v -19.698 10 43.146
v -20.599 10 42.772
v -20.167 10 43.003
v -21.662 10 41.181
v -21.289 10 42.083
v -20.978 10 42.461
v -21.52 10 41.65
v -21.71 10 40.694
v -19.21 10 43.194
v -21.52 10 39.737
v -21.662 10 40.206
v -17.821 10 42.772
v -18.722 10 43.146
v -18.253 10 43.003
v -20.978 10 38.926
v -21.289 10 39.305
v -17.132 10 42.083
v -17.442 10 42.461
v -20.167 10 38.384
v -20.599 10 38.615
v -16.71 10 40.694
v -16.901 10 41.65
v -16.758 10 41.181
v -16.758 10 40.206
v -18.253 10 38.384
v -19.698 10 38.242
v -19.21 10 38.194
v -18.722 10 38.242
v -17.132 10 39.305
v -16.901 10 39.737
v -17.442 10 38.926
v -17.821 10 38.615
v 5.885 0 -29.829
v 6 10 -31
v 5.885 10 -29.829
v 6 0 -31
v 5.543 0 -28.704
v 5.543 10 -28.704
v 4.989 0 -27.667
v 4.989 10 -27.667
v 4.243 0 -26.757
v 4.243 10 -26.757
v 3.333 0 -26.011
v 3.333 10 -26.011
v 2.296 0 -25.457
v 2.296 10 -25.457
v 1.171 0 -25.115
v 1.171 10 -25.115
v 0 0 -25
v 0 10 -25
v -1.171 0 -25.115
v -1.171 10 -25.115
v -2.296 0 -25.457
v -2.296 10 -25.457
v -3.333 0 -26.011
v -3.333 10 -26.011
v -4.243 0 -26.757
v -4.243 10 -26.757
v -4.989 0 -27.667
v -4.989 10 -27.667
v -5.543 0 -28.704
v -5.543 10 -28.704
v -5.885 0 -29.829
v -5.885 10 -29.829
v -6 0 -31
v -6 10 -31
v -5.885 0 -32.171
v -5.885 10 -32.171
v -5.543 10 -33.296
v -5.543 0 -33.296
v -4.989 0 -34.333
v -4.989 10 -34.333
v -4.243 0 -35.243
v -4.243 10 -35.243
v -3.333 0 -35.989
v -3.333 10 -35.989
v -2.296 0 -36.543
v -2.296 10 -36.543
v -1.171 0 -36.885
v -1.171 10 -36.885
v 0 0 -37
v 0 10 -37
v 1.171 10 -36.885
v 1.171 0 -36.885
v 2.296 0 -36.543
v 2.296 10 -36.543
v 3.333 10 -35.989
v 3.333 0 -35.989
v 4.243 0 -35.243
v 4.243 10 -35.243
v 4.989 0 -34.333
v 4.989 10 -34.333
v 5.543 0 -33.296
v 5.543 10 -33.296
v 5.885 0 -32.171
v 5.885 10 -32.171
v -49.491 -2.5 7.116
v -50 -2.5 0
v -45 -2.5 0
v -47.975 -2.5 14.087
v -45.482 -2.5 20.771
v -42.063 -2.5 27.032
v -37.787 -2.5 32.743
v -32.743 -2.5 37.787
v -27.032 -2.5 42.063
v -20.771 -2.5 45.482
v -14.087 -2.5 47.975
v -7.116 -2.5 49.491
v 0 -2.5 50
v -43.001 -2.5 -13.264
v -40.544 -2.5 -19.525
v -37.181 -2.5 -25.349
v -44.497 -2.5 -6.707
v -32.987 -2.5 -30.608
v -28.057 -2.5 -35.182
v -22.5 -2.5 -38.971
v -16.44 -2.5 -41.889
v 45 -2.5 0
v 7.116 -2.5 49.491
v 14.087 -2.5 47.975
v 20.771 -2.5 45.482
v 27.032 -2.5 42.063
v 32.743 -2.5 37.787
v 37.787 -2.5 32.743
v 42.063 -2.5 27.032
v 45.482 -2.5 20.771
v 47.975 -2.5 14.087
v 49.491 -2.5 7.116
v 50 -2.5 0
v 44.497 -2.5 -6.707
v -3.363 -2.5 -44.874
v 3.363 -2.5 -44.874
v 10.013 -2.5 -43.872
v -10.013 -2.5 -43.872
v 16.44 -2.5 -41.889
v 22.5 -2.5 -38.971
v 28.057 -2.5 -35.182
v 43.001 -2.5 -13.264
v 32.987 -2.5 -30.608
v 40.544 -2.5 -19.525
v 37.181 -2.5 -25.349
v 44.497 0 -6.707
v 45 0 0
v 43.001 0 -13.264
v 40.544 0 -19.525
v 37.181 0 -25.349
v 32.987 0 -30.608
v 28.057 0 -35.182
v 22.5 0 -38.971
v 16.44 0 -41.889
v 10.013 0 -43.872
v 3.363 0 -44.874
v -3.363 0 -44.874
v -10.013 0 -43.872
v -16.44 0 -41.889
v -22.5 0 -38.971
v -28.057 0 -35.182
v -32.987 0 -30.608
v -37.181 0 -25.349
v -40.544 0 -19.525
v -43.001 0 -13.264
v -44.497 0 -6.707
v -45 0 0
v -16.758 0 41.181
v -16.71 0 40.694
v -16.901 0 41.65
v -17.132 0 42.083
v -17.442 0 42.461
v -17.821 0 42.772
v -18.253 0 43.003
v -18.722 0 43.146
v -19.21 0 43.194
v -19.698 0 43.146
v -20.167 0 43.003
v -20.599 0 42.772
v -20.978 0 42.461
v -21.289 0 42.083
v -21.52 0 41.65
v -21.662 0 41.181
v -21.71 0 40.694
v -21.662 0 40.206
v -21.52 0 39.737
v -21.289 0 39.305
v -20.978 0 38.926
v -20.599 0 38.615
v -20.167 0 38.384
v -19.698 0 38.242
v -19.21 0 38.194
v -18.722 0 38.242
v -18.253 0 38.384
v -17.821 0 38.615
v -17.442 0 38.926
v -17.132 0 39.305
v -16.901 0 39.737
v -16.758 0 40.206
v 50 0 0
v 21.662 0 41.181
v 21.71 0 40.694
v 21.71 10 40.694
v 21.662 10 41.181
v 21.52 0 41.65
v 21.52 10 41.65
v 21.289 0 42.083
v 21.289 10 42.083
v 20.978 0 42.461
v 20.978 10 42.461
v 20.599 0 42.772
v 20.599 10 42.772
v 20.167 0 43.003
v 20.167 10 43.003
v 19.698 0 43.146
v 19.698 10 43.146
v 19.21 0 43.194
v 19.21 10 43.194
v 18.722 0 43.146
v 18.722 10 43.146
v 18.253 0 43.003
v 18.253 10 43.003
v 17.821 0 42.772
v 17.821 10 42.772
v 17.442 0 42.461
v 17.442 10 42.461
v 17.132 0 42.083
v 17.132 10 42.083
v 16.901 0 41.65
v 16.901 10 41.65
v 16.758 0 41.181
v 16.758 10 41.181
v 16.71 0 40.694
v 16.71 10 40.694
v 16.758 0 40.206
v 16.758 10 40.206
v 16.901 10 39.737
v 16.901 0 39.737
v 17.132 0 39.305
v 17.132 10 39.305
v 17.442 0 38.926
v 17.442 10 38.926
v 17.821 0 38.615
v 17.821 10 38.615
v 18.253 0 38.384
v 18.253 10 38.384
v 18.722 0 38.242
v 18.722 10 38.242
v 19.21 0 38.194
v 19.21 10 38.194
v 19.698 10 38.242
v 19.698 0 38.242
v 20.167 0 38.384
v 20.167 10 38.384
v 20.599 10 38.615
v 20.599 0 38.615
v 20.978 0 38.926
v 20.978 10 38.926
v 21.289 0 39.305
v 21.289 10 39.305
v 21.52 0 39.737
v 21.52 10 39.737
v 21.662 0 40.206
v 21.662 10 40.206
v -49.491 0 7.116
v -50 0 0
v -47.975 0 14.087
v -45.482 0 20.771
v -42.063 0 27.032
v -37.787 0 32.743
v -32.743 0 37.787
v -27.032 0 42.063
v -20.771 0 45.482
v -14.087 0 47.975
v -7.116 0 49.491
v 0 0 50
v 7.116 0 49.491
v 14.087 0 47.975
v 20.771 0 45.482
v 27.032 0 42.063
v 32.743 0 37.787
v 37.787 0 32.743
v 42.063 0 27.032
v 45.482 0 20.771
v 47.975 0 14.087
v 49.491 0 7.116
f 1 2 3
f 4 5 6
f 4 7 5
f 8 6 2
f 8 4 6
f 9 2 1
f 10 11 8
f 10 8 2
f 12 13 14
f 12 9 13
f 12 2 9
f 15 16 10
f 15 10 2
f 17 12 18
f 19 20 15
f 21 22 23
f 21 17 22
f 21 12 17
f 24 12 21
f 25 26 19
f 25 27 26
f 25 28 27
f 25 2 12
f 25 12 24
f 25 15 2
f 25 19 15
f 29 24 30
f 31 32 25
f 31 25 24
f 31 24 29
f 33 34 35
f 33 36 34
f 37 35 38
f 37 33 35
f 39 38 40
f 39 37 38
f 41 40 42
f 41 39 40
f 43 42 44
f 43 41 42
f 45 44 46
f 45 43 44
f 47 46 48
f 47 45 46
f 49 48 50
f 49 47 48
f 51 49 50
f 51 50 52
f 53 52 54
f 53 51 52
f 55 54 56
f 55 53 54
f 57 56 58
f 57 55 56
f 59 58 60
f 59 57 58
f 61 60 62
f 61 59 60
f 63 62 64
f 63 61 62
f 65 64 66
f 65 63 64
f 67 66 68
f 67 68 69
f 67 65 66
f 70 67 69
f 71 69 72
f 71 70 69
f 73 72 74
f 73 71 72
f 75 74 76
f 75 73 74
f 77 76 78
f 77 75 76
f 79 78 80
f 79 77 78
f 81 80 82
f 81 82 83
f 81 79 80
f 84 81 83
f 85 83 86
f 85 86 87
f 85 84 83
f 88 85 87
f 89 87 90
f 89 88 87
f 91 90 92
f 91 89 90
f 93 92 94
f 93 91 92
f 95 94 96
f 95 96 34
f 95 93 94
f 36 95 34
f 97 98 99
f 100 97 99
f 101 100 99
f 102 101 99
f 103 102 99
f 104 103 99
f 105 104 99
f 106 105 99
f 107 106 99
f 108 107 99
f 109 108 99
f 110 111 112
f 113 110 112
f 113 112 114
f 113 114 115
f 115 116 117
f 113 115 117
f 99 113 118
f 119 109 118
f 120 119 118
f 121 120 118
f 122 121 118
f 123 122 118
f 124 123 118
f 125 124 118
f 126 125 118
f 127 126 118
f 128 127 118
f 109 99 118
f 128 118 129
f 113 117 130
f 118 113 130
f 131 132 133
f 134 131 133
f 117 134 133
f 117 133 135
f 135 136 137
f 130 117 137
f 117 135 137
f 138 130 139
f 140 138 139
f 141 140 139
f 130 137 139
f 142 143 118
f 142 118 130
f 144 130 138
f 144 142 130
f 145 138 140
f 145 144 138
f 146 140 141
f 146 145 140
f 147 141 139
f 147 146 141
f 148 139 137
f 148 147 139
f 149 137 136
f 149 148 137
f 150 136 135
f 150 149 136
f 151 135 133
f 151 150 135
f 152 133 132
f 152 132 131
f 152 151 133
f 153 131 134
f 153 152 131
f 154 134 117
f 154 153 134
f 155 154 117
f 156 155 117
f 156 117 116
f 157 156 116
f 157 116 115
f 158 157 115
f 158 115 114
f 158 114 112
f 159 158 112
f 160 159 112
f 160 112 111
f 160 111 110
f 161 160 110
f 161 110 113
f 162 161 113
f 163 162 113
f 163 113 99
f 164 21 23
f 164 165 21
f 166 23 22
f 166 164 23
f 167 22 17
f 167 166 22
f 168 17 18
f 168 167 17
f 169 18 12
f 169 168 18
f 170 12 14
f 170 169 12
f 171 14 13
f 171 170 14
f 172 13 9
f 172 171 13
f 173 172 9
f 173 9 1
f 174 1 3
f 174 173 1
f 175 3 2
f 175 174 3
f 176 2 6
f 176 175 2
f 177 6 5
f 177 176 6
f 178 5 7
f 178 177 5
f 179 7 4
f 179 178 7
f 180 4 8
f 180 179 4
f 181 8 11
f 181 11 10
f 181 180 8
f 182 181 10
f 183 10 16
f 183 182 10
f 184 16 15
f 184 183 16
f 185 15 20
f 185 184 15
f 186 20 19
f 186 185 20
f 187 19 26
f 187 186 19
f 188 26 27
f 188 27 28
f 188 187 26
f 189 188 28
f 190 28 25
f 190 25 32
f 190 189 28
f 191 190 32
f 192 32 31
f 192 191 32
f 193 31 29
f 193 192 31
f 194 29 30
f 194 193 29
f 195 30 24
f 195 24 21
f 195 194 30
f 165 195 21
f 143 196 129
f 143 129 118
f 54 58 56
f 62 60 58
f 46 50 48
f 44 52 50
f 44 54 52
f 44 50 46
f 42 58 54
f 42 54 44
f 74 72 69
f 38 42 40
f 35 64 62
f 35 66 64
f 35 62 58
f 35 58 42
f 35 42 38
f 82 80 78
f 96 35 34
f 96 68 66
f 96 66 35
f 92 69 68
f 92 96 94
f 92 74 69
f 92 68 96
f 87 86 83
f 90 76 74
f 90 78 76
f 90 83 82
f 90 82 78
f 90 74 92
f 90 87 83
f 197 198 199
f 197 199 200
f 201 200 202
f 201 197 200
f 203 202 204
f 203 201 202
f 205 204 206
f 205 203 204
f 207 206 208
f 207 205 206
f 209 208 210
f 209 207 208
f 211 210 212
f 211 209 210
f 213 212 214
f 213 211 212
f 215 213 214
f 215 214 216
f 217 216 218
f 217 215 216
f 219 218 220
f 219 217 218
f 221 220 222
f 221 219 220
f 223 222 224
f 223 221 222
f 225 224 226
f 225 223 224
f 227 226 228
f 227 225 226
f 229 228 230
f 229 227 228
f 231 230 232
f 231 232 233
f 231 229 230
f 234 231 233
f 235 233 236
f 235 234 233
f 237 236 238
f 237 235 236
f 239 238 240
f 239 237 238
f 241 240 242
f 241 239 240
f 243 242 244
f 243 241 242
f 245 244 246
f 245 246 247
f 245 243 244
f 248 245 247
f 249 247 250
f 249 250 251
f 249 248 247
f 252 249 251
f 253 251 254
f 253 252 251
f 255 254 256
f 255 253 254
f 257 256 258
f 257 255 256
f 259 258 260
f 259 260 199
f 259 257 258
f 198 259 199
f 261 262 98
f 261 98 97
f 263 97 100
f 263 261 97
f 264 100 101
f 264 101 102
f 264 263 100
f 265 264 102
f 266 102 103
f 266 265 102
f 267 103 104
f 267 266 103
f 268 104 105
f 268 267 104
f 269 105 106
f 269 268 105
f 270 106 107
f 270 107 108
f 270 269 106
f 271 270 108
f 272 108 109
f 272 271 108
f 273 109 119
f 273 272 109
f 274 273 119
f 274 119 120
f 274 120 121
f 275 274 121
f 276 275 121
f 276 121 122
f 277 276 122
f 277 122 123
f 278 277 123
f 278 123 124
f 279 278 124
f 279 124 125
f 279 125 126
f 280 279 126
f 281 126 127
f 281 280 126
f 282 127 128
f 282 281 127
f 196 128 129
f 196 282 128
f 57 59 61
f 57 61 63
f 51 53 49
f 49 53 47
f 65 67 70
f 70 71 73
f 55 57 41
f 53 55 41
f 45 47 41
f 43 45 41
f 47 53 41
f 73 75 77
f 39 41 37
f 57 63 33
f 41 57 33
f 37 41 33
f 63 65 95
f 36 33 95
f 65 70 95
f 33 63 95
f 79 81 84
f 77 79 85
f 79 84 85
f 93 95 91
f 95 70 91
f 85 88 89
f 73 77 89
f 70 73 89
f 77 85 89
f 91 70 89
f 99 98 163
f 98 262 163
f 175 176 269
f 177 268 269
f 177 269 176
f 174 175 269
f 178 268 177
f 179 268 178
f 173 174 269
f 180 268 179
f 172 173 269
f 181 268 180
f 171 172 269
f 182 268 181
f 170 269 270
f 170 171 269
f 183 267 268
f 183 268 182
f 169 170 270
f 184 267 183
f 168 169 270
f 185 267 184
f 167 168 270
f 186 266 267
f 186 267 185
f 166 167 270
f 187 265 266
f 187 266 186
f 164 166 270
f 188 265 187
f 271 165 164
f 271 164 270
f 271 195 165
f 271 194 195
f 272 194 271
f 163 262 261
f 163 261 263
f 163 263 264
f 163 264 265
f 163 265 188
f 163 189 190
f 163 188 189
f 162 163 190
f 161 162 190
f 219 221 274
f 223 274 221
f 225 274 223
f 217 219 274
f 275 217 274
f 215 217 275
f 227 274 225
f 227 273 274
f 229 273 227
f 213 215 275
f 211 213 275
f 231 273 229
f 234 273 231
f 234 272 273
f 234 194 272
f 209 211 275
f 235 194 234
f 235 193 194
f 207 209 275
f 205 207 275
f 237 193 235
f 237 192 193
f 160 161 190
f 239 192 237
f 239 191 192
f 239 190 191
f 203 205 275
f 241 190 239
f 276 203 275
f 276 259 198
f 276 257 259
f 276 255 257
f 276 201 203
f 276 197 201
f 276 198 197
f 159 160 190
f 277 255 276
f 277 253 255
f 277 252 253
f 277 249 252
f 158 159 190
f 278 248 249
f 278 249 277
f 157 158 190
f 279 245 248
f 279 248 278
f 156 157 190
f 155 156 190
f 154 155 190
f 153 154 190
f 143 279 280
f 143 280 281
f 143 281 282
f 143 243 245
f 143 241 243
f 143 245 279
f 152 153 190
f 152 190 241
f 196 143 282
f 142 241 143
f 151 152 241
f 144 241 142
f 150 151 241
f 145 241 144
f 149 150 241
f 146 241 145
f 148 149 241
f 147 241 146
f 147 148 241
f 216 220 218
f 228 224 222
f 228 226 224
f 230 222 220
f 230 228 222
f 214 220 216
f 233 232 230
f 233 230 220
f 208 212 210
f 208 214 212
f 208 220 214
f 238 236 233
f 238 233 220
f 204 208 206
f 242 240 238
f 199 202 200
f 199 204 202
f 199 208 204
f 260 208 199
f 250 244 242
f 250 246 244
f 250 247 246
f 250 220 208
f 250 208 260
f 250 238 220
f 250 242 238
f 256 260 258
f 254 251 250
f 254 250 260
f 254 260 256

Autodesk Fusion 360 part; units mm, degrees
sketch "Sketch1" plane through (0, 0, 0) normal (0, 1, 0) x (1, 0, 0)
  arc A0 (37.5, 0) -> (-37.5, 0) centre (0, 0) ccw
  line L0 (-37.5, 0) -> (37.5, 0)
  line L1 (-50, 0) -> (-37.5, 0)
  line L2 (50, 0) -> (37.5, 0)
  arc A1 (-50, 0) -> (50, 0) centre (0, 0) ccw
  line L3 (0, 37.5) -> (0, 31)
  circle A2 centre (0, 31) radius 6
  line L4 (0, 37.5) -> (0, -50) construction
  line L5 (0, 31) -> (20.5233, -45.5938)
  line L6 (0, 31) -> (79.2958, 31) construction
  line L7 (0, 31) -> (80.809, 31) construction
  line L8 (0, 31) -> (13.9333, -48.0194)
  line L9 (0, 31) -> (80.2384, 31) construction
  line L10 (0, 31) -> (26.6753, -42.2898)
  line L11 (0, 31) -> (77.9934, 31) construction
  line L12 (0, 31) -> (32.2663, -38.1953)
  line L13 (0, 31) -> (76.3486, 31) construction
  line L14 (0, 31) -> (37.1918, -33.4181)
  line L15 (0, 31) -> (74.3836, 31) construction
  line L16 (0, 31) -> (44.7413, -22.3207)
  line L17 (0, 31) -> (69.6052, 31) construction
  line L18 (0, 31) -> (41.3694, -28.0816)
  line L19 (0, 31) -> (72.1253, 31) construction
  line L20 (0, 31) -> (66.8592, 31) construction
  circle A3 centre (41.1995, -18.0997) radius 2.5
  circle A4 centre (38.2758, -23.6635) radius 2.5
  circle A5 centre (34.5465, -28.8364) radius 2.5
  circle A6 centre (30.0677, -33.4804) radius 2.5
  circle A7 centre (24.9208, -37.4694) radius 2.5
  circle A8 centre (19.2102, -40.6936) radius 2.5
  circle A9 centre (13.0594, -43.0634) radius 2.5
  circle A10 centre (0, 0) radius 25
  circle A11 centre (0, 0) radius 45
  circle A12 centre (9.5407, -23.1079) radius 2.5
  circle A13 centre (17.7067, -17.6486) radius 2.5
  circle A14 centre (23.2309, -9.2371) radius 2.5
  circle A15 centre (-9.5407, -23.1079) radius 2.5
  circle A16 centre (-17.7067, -17.6486) radius 2.5
  circle A17 centre (-23.2309, -9.2371) radius 2.5
  circle A18 centre (-13.0594, -43.0634) radius 2.5
  circle A19 centre (-19.2102, -40.6936) radius 2.5
  circle A20 centre (-24.9208, -37.4694) radius 2.5
  circle A21 centre (-30.0677, -33.4804) radius 2.5
  circle A22 centre (-34.5465, -28.8364) radius 2.5
  circle A23 centre (-38.2758, -23.6635) radius 2.5
  circle A24 centre (-41.1995, -18.0997) radius 2.5
  dimension "d1" = 75
  dimension "d3" = 75
  dimension "d5" = 80
  dimension "d6" = 70
  dimension "d7" = 65
  dimension "d8" = 60
  dimension "d9" = 50
  dimension "d10" = 55
  dimension "d13" = 5
  dimension "d14" = 5
  dimension "d15" = 5
  dimension "d16" = 5
  dimension "d17" = 5
  dimension "d18" = 5
  dimension "d19" = 5
  dimension "d21" = 50
  dimension "d26" = 5
  dimension "d27" = 5
  dimension "d28" = 5
extrude "Extrude2" add sketch "Sketch1" against normal blind 2.5 makes body 1
extrude "Extrude1" add sketch "Sketch1" along normal blind 10 separate body contours L3 A2 L16 | L3 A2 L8 | A2 L5 L10 | A2 L5 L8 | A2 L10 L12 | A2 L12 L14 | A2 L14 L18 | A2 L16 L18 makes body 2
extrude "Extrude3" add sketch "Sketch1" along normal blind 10 contours L5 A8 A11 | L5 A8 A11 | L5 A8 A11 | L5 A8 A11 | A11 A19 | A11 A19 bodies 1
